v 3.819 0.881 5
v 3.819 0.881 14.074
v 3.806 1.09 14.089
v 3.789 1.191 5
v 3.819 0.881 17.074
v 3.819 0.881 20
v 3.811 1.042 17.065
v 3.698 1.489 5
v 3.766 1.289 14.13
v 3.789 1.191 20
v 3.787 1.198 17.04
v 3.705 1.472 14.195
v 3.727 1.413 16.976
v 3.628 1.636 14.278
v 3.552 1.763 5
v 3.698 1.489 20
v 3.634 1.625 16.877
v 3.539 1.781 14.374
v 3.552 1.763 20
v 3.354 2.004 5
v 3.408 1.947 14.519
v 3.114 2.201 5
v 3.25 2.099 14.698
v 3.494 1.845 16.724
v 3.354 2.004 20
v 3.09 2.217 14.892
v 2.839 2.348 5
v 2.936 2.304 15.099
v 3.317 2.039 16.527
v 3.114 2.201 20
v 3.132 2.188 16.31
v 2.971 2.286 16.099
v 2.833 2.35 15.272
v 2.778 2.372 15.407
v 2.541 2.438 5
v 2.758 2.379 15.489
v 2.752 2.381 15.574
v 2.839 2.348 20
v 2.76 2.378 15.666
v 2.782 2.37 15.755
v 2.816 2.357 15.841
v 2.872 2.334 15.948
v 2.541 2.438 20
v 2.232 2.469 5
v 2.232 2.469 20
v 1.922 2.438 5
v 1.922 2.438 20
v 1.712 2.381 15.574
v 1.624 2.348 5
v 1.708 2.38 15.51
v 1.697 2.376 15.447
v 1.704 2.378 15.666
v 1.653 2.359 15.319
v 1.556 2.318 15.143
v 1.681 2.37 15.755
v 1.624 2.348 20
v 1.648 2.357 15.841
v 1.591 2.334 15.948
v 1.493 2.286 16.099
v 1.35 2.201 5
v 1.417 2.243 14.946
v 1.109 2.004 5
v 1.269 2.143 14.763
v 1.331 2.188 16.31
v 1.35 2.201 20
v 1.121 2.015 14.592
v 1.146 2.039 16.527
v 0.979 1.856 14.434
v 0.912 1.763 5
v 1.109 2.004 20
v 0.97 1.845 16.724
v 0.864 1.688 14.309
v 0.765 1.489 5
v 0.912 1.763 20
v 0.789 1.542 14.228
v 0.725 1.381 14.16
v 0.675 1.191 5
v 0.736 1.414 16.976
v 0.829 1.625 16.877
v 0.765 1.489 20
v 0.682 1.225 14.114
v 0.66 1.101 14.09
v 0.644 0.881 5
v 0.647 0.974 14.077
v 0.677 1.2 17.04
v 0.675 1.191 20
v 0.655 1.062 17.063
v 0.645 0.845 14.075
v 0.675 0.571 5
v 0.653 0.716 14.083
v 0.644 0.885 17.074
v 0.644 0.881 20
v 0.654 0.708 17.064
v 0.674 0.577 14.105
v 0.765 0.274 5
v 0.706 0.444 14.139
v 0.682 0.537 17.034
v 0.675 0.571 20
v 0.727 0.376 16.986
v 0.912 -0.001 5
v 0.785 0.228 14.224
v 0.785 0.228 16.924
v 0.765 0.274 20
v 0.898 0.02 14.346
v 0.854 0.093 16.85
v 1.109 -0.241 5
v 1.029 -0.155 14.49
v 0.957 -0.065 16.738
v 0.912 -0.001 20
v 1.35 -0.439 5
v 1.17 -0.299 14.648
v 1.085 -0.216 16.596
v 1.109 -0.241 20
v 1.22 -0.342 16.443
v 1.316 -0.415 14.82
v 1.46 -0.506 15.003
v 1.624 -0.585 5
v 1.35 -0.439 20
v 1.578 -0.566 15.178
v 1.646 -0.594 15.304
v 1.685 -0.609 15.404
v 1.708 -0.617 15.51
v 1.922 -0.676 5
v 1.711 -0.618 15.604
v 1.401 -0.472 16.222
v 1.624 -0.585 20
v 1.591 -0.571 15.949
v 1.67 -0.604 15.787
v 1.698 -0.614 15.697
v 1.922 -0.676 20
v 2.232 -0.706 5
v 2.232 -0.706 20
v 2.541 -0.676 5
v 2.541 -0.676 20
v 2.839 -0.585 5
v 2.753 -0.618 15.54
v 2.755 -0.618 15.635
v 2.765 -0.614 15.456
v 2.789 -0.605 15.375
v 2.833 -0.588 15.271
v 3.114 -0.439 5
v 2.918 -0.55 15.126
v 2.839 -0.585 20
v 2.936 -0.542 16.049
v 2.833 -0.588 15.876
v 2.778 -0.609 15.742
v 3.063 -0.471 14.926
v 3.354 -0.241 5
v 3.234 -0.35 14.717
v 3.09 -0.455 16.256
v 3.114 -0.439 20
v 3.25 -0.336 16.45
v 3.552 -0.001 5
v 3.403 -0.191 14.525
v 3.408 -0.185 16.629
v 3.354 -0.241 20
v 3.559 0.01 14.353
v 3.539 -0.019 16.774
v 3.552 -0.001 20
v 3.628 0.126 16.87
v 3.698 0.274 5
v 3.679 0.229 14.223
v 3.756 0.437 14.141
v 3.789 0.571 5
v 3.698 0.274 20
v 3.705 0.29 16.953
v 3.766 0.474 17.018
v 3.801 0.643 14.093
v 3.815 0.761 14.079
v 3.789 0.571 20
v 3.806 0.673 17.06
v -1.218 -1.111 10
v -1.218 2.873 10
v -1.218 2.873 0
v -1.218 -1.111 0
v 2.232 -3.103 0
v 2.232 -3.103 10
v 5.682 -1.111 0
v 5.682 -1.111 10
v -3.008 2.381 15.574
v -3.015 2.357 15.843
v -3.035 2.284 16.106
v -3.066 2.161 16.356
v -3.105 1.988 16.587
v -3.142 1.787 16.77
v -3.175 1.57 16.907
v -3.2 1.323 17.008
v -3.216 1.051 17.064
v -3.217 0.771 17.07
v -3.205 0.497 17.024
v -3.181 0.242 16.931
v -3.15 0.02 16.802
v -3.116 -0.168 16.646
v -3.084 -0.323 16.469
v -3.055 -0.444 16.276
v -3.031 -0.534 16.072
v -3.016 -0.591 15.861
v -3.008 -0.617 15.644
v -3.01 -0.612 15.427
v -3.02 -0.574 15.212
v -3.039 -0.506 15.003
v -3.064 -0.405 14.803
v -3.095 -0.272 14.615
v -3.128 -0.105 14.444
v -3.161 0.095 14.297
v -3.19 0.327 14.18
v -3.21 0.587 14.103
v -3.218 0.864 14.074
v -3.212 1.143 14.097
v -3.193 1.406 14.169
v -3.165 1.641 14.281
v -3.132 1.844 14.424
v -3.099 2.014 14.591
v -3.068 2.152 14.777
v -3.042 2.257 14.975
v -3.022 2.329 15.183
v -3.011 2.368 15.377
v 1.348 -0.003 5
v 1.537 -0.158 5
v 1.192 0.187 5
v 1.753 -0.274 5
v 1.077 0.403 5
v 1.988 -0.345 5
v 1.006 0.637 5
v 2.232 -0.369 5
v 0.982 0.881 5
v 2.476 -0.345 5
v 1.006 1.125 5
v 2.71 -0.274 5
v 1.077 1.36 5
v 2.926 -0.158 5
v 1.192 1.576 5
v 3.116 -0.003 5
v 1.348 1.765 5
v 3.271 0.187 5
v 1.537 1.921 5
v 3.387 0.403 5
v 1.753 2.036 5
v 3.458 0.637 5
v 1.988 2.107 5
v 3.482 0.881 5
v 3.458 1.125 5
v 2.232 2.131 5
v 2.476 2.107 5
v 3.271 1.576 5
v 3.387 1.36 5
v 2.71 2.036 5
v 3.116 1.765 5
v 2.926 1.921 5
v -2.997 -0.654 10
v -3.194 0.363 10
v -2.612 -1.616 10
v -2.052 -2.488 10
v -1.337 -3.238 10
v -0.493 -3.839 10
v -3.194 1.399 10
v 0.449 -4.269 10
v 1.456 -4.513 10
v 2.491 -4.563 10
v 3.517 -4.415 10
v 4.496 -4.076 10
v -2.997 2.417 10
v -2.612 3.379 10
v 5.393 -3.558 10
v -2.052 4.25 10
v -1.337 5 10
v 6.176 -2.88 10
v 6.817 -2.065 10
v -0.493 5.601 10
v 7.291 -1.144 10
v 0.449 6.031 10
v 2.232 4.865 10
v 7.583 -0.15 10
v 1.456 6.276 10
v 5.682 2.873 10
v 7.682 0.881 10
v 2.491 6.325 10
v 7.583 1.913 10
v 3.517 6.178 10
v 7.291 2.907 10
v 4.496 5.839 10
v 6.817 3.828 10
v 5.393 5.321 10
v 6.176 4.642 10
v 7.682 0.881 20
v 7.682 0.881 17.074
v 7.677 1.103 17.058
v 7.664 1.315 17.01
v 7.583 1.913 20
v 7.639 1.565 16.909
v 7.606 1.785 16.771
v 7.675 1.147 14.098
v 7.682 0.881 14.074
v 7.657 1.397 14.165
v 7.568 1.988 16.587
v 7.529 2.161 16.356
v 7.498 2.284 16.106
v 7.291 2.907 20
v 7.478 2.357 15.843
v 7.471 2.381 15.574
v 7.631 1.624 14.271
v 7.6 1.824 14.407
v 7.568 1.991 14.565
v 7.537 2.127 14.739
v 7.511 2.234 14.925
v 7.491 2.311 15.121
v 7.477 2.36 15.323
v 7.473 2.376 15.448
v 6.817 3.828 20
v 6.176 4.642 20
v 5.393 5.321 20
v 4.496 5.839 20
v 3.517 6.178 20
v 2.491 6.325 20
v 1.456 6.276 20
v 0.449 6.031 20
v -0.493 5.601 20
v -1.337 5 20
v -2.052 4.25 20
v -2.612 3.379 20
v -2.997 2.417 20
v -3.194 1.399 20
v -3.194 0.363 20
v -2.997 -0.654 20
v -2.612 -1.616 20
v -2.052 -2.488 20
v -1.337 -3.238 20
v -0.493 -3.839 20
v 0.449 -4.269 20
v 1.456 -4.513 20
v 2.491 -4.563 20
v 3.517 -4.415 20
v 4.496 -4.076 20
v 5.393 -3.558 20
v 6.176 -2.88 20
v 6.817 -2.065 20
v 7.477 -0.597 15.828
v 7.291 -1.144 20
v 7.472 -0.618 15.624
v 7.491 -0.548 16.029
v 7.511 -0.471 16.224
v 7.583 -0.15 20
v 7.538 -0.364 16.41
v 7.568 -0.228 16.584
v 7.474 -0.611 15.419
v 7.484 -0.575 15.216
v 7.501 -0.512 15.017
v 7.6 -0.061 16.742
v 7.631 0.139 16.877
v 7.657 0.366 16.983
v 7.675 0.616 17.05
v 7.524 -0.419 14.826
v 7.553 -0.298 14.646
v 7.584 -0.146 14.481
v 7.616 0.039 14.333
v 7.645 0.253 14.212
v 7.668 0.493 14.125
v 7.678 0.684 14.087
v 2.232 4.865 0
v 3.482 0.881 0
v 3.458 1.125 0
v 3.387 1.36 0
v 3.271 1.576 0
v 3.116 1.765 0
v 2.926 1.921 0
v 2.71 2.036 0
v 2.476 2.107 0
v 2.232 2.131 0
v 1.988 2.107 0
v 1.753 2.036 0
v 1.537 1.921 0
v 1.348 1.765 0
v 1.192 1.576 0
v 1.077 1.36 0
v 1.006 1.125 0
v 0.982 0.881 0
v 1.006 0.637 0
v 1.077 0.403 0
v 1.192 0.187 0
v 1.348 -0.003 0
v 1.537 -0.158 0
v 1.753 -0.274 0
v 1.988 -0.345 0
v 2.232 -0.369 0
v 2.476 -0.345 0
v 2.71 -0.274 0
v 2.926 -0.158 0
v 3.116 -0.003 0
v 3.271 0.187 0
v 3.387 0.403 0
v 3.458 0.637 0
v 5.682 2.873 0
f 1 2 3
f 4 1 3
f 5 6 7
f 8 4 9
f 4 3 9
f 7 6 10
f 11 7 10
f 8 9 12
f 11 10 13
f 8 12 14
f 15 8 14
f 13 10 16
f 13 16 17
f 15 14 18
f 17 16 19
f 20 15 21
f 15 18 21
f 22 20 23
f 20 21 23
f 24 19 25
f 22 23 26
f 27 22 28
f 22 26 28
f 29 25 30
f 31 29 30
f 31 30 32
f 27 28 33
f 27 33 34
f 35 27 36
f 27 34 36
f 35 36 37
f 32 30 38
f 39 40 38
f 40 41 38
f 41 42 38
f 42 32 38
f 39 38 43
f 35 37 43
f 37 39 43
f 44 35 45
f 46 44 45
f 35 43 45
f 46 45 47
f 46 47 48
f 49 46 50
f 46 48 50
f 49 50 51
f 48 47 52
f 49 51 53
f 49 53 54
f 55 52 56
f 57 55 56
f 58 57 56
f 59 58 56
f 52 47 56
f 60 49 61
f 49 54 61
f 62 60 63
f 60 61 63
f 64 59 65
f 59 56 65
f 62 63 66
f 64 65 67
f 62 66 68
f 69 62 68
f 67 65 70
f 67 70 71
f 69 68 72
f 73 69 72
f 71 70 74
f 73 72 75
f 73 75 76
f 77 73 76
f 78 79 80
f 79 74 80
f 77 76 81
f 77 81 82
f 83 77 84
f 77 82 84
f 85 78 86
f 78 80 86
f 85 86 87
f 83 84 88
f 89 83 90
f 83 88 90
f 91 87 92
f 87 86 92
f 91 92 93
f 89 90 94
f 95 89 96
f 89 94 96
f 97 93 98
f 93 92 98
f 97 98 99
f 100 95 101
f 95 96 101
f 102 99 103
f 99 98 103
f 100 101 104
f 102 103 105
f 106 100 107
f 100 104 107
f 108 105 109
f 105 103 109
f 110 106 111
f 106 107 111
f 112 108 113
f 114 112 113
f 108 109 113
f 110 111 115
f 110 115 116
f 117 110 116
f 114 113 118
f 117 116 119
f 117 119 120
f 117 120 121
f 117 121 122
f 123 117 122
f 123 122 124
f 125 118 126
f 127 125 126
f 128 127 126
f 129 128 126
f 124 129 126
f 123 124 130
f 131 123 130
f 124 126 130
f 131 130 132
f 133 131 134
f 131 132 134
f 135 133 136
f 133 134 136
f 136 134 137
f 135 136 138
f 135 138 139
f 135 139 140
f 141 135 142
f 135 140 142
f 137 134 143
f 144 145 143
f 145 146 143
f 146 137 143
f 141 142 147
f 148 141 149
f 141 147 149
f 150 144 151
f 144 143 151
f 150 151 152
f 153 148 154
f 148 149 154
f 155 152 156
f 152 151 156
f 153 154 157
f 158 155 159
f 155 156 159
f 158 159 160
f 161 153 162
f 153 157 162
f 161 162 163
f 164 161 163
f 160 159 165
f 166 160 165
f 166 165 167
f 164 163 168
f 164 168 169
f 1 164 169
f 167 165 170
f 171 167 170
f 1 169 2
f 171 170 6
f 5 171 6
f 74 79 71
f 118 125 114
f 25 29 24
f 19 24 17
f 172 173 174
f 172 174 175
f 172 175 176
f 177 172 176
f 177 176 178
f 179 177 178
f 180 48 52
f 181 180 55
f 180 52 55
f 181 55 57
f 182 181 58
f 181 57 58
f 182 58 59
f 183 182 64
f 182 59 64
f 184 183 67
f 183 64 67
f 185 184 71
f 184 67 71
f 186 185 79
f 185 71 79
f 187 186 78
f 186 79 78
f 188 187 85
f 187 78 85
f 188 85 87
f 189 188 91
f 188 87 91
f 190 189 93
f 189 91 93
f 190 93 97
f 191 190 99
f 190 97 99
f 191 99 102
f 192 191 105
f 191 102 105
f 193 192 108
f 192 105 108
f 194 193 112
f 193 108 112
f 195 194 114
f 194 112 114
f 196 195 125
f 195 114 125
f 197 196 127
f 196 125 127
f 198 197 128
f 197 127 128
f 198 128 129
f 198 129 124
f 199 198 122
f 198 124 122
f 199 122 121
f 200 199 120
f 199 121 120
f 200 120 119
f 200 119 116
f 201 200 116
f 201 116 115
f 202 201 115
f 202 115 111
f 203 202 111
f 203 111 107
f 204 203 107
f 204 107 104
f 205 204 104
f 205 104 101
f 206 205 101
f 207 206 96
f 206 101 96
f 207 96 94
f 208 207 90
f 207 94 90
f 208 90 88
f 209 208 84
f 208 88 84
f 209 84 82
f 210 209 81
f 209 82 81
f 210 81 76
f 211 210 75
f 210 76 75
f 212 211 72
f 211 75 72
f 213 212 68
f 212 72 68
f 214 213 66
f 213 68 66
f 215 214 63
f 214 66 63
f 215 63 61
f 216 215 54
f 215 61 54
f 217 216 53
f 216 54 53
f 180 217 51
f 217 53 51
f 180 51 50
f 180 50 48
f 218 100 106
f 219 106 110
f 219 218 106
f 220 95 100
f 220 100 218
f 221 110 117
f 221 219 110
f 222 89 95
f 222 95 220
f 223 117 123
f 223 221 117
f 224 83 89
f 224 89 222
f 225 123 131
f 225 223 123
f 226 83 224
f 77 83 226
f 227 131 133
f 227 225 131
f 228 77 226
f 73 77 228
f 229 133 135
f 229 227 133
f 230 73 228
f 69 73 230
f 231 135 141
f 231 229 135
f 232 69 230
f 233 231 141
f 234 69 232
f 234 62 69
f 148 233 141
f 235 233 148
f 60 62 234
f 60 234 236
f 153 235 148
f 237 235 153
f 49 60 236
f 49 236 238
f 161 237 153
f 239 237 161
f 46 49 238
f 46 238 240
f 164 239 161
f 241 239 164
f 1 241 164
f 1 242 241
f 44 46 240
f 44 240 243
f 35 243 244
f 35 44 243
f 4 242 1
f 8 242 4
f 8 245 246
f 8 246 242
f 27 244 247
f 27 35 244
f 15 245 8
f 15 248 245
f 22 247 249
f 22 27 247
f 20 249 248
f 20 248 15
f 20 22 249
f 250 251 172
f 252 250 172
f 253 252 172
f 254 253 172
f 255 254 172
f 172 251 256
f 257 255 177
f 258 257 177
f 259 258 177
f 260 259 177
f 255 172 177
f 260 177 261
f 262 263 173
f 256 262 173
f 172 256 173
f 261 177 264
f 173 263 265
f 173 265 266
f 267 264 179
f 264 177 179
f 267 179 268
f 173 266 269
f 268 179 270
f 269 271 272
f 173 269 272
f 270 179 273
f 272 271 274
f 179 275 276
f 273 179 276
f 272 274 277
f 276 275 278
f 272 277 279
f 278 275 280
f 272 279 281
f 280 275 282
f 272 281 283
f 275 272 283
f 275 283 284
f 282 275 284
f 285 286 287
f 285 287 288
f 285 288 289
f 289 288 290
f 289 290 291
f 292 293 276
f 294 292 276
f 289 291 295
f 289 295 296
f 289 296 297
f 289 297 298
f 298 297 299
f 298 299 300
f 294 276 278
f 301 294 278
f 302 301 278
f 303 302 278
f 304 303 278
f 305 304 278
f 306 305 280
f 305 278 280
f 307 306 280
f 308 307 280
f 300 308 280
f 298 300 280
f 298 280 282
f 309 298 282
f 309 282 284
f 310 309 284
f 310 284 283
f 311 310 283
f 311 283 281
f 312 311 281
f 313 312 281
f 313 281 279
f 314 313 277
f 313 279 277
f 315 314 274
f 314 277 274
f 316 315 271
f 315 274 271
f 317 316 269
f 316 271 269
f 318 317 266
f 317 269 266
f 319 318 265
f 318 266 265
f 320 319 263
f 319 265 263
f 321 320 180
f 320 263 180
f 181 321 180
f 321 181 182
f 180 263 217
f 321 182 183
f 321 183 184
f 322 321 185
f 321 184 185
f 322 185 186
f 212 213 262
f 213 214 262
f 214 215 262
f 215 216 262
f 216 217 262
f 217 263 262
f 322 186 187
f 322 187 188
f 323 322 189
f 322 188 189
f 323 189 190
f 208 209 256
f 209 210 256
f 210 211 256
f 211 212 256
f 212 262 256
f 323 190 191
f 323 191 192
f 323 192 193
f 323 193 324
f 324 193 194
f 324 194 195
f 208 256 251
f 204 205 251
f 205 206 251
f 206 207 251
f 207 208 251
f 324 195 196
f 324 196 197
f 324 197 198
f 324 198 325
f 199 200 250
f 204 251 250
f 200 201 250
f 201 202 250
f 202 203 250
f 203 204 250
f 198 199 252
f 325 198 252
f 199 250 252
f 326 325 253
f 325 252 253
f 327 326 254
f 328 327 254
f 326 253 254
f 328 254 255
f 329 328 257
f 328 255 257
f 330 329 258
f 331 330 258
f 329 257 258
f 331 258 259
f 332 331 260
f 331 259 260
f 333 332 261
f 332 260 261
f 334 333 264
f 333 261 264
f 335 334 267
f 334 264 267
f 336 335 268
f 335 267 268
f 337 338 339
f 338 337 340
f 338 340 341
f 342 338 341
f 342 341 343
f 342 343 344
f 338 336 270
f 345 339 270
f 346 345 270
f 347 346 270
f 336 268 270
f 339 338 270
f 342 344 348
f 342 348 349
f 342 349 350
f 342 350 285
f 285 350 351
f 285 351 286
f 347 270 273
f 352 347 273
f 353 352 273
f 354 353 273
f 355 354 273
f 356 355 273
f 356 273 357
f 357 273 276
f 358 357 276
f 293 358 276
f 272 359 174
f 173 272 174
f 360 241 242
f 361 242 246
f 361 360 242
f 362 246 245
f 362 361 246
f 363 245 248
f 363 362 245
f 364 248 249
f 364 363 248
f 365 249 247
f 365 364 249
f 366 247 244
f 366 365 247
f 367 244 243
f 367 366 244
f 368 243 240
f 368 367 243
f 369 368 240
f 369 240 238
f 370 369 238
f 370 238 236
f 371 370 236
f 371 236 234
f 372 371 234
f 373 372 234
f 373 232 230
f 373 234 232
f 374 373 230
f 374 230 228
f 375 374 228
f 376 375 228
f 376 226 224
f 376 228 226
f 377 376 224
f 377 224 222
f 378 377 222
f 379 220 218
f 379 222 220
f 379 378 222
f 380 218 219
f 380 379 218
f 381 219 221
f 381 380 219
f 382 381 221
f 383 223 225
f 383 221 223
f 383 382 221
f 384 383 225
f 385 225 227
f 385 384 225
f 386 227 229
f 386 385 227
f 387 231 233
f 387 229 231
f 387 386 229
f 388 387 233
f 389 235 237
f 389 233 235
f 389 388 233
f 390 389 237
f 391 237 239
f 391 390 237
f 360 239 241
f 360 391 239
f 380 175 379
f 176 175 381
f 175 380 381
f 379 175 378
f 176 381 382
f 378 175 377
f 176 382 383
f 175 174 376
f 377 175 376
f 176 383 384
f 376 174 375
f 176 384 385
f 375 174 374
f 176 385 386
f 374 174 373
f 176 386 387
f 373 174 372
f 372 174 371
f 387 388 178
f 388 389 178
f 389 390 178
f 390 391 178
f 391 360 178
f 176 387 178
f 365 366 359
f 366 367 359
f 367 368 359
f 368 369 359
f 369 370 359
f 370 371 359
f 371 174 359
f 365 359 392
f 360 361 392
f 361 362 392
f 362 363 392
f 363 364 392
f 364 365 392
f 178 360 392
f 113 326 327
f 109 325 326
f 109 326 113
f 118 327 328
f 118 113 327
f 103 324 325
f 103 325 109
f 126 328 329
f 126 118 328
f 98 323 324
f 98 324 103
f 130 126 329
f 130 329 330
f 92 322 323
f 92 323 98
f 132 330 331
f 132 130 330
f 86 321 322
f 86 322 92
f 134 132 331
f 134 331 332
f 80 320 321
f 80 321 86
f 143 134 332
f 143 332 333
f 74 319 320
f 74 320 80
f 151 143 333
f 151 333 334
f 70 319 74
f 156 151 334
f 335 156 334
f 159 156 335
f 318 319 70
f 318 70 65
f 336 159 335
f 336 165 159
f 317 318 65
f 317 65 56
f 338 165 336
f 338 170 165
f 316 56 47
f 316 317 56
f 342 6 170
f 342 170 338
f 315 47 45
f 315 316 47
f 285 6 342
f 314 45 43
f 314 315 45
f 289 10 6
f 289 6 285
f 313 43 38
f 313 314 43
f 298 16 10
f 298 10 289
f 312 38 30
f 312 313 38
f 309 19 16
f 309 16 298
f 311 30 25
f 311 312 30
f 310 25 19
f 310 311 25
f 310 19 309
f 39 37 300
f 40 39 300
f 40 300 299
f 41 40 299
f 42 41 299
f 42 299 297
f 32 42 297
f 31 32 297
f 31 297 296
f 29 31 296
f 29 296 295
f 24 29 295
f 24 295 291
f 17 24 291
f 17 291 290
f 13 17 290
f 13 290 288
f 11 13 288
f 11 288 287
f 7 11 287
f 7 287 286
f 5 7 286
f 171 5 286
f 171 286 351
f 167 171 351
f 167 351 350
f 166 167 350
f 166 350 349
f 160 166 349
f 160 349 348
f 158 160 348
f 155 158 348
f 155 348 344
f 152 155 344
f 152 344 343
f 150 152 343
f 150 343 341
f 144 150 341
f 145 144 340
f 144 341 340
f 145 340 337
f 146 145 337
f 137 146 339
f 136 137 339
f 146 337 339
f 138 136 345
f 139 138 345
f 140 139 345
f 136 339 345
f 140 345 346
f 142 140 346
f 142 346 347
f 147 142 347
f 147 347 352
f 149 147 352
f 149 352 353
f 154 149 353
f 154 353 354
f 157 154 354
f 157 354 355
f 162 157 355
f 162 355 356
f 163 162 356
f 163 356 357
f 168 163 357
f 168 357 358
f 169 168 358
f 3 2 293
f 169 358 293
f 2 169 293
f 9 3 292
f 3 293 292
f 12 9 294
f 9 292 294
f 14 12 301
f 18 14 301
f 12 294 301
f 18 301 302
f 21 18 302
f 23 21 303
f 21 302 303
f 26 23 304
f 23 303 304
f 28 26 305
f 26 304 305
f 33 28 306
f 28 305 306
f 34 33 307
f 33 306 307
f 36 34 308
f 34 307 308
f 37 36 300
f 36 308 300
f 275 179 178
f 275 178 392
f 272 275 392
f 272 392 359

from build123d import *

# Parameters (mm, degrees)
F0_R     = 1.25
F1_DEPTH = 10
F2_R     = 5.45
F2_R_2   = 1.25
F3_DEPTH = 10
F4_R     = 1.5875
F5_DEPTH = 15
F6_R     = 1.5
F7_DEPTH = 12.5


with BuildPart() as f1:
    # F0 (on Top) → F1 (new body)
    with BuildSketch(Plane.XY):
        Polygon((2.2317760525, -3.1025133052), (5.6817760525, -1.1106548765), (5.6817760525, 2.8730619809), (2.2317760525, 4.8649204096), (-1.2182239475, 2.8730619809), (-1.2182239475, -1.1106548765), align=None)
        with Locations((2.2317760525, 0.8812035522)):
            Circle(F0_R, mode=Mode.SUBTRACT)
    extrude(amount=F1_DEPTH)

    # F2 (on face) → F3 (join)
    with BuildSketch(Plane.XY.offset(10)):
        with Locations((2.2317760525, 0.8812035522)):
            Circle(F2_R)
        Polygon((2.2317760525, -3.1025133052), (-1.2182239475, -1.1106548765), (-1.2182239475, 2.8730619809), (2.2317760525, 4.8649204096), (5.6817760525, 2.8730619809), (5.6817760525, -1.1106548765), align=None, mode=Mode.SUBTRACT)
        Polygon((-1.2182239475, 2.8730619809), (-1.2182239475, -1.1106548765), (2.2317760525, -3.1025133052), (5.6817760525, -1.1106548765), (5.6817760525, 2.8730619809), (2.2317760525, 4.8649204096), align=None)
        with Locations((2.2317760525, 0.8812035522)):
            Circle(F2_R_2, mode=Mode.SUBTRACT)
        with Locations((2.2317760525, 0.8812035522)):
            Circle(F2_R_2)
    extrude(amount=F3_DEPTH)

    # F4 (on face) → F5 (cut)
    with BuildSketch(Plane.XY.offset(20)):
        with Locations((2.2317760525, 0.8812035522)):
            Circle(F4_R)
    extrude(amount=-F5_DEPTH, mode=Mode.SUBTRACT)

    # F6 (on face) → F7 (cut, symmetric)
    with BuildSketch(Plane.YZ.offset(5.6817760525)):
        with Locations((0.8812035522, 15.5740641057)):
            Circle(F6_R)
    extrude(amount=F7_DEPTH, both=True, mode=Mode.SUBTRACT)


solid = f1.part
